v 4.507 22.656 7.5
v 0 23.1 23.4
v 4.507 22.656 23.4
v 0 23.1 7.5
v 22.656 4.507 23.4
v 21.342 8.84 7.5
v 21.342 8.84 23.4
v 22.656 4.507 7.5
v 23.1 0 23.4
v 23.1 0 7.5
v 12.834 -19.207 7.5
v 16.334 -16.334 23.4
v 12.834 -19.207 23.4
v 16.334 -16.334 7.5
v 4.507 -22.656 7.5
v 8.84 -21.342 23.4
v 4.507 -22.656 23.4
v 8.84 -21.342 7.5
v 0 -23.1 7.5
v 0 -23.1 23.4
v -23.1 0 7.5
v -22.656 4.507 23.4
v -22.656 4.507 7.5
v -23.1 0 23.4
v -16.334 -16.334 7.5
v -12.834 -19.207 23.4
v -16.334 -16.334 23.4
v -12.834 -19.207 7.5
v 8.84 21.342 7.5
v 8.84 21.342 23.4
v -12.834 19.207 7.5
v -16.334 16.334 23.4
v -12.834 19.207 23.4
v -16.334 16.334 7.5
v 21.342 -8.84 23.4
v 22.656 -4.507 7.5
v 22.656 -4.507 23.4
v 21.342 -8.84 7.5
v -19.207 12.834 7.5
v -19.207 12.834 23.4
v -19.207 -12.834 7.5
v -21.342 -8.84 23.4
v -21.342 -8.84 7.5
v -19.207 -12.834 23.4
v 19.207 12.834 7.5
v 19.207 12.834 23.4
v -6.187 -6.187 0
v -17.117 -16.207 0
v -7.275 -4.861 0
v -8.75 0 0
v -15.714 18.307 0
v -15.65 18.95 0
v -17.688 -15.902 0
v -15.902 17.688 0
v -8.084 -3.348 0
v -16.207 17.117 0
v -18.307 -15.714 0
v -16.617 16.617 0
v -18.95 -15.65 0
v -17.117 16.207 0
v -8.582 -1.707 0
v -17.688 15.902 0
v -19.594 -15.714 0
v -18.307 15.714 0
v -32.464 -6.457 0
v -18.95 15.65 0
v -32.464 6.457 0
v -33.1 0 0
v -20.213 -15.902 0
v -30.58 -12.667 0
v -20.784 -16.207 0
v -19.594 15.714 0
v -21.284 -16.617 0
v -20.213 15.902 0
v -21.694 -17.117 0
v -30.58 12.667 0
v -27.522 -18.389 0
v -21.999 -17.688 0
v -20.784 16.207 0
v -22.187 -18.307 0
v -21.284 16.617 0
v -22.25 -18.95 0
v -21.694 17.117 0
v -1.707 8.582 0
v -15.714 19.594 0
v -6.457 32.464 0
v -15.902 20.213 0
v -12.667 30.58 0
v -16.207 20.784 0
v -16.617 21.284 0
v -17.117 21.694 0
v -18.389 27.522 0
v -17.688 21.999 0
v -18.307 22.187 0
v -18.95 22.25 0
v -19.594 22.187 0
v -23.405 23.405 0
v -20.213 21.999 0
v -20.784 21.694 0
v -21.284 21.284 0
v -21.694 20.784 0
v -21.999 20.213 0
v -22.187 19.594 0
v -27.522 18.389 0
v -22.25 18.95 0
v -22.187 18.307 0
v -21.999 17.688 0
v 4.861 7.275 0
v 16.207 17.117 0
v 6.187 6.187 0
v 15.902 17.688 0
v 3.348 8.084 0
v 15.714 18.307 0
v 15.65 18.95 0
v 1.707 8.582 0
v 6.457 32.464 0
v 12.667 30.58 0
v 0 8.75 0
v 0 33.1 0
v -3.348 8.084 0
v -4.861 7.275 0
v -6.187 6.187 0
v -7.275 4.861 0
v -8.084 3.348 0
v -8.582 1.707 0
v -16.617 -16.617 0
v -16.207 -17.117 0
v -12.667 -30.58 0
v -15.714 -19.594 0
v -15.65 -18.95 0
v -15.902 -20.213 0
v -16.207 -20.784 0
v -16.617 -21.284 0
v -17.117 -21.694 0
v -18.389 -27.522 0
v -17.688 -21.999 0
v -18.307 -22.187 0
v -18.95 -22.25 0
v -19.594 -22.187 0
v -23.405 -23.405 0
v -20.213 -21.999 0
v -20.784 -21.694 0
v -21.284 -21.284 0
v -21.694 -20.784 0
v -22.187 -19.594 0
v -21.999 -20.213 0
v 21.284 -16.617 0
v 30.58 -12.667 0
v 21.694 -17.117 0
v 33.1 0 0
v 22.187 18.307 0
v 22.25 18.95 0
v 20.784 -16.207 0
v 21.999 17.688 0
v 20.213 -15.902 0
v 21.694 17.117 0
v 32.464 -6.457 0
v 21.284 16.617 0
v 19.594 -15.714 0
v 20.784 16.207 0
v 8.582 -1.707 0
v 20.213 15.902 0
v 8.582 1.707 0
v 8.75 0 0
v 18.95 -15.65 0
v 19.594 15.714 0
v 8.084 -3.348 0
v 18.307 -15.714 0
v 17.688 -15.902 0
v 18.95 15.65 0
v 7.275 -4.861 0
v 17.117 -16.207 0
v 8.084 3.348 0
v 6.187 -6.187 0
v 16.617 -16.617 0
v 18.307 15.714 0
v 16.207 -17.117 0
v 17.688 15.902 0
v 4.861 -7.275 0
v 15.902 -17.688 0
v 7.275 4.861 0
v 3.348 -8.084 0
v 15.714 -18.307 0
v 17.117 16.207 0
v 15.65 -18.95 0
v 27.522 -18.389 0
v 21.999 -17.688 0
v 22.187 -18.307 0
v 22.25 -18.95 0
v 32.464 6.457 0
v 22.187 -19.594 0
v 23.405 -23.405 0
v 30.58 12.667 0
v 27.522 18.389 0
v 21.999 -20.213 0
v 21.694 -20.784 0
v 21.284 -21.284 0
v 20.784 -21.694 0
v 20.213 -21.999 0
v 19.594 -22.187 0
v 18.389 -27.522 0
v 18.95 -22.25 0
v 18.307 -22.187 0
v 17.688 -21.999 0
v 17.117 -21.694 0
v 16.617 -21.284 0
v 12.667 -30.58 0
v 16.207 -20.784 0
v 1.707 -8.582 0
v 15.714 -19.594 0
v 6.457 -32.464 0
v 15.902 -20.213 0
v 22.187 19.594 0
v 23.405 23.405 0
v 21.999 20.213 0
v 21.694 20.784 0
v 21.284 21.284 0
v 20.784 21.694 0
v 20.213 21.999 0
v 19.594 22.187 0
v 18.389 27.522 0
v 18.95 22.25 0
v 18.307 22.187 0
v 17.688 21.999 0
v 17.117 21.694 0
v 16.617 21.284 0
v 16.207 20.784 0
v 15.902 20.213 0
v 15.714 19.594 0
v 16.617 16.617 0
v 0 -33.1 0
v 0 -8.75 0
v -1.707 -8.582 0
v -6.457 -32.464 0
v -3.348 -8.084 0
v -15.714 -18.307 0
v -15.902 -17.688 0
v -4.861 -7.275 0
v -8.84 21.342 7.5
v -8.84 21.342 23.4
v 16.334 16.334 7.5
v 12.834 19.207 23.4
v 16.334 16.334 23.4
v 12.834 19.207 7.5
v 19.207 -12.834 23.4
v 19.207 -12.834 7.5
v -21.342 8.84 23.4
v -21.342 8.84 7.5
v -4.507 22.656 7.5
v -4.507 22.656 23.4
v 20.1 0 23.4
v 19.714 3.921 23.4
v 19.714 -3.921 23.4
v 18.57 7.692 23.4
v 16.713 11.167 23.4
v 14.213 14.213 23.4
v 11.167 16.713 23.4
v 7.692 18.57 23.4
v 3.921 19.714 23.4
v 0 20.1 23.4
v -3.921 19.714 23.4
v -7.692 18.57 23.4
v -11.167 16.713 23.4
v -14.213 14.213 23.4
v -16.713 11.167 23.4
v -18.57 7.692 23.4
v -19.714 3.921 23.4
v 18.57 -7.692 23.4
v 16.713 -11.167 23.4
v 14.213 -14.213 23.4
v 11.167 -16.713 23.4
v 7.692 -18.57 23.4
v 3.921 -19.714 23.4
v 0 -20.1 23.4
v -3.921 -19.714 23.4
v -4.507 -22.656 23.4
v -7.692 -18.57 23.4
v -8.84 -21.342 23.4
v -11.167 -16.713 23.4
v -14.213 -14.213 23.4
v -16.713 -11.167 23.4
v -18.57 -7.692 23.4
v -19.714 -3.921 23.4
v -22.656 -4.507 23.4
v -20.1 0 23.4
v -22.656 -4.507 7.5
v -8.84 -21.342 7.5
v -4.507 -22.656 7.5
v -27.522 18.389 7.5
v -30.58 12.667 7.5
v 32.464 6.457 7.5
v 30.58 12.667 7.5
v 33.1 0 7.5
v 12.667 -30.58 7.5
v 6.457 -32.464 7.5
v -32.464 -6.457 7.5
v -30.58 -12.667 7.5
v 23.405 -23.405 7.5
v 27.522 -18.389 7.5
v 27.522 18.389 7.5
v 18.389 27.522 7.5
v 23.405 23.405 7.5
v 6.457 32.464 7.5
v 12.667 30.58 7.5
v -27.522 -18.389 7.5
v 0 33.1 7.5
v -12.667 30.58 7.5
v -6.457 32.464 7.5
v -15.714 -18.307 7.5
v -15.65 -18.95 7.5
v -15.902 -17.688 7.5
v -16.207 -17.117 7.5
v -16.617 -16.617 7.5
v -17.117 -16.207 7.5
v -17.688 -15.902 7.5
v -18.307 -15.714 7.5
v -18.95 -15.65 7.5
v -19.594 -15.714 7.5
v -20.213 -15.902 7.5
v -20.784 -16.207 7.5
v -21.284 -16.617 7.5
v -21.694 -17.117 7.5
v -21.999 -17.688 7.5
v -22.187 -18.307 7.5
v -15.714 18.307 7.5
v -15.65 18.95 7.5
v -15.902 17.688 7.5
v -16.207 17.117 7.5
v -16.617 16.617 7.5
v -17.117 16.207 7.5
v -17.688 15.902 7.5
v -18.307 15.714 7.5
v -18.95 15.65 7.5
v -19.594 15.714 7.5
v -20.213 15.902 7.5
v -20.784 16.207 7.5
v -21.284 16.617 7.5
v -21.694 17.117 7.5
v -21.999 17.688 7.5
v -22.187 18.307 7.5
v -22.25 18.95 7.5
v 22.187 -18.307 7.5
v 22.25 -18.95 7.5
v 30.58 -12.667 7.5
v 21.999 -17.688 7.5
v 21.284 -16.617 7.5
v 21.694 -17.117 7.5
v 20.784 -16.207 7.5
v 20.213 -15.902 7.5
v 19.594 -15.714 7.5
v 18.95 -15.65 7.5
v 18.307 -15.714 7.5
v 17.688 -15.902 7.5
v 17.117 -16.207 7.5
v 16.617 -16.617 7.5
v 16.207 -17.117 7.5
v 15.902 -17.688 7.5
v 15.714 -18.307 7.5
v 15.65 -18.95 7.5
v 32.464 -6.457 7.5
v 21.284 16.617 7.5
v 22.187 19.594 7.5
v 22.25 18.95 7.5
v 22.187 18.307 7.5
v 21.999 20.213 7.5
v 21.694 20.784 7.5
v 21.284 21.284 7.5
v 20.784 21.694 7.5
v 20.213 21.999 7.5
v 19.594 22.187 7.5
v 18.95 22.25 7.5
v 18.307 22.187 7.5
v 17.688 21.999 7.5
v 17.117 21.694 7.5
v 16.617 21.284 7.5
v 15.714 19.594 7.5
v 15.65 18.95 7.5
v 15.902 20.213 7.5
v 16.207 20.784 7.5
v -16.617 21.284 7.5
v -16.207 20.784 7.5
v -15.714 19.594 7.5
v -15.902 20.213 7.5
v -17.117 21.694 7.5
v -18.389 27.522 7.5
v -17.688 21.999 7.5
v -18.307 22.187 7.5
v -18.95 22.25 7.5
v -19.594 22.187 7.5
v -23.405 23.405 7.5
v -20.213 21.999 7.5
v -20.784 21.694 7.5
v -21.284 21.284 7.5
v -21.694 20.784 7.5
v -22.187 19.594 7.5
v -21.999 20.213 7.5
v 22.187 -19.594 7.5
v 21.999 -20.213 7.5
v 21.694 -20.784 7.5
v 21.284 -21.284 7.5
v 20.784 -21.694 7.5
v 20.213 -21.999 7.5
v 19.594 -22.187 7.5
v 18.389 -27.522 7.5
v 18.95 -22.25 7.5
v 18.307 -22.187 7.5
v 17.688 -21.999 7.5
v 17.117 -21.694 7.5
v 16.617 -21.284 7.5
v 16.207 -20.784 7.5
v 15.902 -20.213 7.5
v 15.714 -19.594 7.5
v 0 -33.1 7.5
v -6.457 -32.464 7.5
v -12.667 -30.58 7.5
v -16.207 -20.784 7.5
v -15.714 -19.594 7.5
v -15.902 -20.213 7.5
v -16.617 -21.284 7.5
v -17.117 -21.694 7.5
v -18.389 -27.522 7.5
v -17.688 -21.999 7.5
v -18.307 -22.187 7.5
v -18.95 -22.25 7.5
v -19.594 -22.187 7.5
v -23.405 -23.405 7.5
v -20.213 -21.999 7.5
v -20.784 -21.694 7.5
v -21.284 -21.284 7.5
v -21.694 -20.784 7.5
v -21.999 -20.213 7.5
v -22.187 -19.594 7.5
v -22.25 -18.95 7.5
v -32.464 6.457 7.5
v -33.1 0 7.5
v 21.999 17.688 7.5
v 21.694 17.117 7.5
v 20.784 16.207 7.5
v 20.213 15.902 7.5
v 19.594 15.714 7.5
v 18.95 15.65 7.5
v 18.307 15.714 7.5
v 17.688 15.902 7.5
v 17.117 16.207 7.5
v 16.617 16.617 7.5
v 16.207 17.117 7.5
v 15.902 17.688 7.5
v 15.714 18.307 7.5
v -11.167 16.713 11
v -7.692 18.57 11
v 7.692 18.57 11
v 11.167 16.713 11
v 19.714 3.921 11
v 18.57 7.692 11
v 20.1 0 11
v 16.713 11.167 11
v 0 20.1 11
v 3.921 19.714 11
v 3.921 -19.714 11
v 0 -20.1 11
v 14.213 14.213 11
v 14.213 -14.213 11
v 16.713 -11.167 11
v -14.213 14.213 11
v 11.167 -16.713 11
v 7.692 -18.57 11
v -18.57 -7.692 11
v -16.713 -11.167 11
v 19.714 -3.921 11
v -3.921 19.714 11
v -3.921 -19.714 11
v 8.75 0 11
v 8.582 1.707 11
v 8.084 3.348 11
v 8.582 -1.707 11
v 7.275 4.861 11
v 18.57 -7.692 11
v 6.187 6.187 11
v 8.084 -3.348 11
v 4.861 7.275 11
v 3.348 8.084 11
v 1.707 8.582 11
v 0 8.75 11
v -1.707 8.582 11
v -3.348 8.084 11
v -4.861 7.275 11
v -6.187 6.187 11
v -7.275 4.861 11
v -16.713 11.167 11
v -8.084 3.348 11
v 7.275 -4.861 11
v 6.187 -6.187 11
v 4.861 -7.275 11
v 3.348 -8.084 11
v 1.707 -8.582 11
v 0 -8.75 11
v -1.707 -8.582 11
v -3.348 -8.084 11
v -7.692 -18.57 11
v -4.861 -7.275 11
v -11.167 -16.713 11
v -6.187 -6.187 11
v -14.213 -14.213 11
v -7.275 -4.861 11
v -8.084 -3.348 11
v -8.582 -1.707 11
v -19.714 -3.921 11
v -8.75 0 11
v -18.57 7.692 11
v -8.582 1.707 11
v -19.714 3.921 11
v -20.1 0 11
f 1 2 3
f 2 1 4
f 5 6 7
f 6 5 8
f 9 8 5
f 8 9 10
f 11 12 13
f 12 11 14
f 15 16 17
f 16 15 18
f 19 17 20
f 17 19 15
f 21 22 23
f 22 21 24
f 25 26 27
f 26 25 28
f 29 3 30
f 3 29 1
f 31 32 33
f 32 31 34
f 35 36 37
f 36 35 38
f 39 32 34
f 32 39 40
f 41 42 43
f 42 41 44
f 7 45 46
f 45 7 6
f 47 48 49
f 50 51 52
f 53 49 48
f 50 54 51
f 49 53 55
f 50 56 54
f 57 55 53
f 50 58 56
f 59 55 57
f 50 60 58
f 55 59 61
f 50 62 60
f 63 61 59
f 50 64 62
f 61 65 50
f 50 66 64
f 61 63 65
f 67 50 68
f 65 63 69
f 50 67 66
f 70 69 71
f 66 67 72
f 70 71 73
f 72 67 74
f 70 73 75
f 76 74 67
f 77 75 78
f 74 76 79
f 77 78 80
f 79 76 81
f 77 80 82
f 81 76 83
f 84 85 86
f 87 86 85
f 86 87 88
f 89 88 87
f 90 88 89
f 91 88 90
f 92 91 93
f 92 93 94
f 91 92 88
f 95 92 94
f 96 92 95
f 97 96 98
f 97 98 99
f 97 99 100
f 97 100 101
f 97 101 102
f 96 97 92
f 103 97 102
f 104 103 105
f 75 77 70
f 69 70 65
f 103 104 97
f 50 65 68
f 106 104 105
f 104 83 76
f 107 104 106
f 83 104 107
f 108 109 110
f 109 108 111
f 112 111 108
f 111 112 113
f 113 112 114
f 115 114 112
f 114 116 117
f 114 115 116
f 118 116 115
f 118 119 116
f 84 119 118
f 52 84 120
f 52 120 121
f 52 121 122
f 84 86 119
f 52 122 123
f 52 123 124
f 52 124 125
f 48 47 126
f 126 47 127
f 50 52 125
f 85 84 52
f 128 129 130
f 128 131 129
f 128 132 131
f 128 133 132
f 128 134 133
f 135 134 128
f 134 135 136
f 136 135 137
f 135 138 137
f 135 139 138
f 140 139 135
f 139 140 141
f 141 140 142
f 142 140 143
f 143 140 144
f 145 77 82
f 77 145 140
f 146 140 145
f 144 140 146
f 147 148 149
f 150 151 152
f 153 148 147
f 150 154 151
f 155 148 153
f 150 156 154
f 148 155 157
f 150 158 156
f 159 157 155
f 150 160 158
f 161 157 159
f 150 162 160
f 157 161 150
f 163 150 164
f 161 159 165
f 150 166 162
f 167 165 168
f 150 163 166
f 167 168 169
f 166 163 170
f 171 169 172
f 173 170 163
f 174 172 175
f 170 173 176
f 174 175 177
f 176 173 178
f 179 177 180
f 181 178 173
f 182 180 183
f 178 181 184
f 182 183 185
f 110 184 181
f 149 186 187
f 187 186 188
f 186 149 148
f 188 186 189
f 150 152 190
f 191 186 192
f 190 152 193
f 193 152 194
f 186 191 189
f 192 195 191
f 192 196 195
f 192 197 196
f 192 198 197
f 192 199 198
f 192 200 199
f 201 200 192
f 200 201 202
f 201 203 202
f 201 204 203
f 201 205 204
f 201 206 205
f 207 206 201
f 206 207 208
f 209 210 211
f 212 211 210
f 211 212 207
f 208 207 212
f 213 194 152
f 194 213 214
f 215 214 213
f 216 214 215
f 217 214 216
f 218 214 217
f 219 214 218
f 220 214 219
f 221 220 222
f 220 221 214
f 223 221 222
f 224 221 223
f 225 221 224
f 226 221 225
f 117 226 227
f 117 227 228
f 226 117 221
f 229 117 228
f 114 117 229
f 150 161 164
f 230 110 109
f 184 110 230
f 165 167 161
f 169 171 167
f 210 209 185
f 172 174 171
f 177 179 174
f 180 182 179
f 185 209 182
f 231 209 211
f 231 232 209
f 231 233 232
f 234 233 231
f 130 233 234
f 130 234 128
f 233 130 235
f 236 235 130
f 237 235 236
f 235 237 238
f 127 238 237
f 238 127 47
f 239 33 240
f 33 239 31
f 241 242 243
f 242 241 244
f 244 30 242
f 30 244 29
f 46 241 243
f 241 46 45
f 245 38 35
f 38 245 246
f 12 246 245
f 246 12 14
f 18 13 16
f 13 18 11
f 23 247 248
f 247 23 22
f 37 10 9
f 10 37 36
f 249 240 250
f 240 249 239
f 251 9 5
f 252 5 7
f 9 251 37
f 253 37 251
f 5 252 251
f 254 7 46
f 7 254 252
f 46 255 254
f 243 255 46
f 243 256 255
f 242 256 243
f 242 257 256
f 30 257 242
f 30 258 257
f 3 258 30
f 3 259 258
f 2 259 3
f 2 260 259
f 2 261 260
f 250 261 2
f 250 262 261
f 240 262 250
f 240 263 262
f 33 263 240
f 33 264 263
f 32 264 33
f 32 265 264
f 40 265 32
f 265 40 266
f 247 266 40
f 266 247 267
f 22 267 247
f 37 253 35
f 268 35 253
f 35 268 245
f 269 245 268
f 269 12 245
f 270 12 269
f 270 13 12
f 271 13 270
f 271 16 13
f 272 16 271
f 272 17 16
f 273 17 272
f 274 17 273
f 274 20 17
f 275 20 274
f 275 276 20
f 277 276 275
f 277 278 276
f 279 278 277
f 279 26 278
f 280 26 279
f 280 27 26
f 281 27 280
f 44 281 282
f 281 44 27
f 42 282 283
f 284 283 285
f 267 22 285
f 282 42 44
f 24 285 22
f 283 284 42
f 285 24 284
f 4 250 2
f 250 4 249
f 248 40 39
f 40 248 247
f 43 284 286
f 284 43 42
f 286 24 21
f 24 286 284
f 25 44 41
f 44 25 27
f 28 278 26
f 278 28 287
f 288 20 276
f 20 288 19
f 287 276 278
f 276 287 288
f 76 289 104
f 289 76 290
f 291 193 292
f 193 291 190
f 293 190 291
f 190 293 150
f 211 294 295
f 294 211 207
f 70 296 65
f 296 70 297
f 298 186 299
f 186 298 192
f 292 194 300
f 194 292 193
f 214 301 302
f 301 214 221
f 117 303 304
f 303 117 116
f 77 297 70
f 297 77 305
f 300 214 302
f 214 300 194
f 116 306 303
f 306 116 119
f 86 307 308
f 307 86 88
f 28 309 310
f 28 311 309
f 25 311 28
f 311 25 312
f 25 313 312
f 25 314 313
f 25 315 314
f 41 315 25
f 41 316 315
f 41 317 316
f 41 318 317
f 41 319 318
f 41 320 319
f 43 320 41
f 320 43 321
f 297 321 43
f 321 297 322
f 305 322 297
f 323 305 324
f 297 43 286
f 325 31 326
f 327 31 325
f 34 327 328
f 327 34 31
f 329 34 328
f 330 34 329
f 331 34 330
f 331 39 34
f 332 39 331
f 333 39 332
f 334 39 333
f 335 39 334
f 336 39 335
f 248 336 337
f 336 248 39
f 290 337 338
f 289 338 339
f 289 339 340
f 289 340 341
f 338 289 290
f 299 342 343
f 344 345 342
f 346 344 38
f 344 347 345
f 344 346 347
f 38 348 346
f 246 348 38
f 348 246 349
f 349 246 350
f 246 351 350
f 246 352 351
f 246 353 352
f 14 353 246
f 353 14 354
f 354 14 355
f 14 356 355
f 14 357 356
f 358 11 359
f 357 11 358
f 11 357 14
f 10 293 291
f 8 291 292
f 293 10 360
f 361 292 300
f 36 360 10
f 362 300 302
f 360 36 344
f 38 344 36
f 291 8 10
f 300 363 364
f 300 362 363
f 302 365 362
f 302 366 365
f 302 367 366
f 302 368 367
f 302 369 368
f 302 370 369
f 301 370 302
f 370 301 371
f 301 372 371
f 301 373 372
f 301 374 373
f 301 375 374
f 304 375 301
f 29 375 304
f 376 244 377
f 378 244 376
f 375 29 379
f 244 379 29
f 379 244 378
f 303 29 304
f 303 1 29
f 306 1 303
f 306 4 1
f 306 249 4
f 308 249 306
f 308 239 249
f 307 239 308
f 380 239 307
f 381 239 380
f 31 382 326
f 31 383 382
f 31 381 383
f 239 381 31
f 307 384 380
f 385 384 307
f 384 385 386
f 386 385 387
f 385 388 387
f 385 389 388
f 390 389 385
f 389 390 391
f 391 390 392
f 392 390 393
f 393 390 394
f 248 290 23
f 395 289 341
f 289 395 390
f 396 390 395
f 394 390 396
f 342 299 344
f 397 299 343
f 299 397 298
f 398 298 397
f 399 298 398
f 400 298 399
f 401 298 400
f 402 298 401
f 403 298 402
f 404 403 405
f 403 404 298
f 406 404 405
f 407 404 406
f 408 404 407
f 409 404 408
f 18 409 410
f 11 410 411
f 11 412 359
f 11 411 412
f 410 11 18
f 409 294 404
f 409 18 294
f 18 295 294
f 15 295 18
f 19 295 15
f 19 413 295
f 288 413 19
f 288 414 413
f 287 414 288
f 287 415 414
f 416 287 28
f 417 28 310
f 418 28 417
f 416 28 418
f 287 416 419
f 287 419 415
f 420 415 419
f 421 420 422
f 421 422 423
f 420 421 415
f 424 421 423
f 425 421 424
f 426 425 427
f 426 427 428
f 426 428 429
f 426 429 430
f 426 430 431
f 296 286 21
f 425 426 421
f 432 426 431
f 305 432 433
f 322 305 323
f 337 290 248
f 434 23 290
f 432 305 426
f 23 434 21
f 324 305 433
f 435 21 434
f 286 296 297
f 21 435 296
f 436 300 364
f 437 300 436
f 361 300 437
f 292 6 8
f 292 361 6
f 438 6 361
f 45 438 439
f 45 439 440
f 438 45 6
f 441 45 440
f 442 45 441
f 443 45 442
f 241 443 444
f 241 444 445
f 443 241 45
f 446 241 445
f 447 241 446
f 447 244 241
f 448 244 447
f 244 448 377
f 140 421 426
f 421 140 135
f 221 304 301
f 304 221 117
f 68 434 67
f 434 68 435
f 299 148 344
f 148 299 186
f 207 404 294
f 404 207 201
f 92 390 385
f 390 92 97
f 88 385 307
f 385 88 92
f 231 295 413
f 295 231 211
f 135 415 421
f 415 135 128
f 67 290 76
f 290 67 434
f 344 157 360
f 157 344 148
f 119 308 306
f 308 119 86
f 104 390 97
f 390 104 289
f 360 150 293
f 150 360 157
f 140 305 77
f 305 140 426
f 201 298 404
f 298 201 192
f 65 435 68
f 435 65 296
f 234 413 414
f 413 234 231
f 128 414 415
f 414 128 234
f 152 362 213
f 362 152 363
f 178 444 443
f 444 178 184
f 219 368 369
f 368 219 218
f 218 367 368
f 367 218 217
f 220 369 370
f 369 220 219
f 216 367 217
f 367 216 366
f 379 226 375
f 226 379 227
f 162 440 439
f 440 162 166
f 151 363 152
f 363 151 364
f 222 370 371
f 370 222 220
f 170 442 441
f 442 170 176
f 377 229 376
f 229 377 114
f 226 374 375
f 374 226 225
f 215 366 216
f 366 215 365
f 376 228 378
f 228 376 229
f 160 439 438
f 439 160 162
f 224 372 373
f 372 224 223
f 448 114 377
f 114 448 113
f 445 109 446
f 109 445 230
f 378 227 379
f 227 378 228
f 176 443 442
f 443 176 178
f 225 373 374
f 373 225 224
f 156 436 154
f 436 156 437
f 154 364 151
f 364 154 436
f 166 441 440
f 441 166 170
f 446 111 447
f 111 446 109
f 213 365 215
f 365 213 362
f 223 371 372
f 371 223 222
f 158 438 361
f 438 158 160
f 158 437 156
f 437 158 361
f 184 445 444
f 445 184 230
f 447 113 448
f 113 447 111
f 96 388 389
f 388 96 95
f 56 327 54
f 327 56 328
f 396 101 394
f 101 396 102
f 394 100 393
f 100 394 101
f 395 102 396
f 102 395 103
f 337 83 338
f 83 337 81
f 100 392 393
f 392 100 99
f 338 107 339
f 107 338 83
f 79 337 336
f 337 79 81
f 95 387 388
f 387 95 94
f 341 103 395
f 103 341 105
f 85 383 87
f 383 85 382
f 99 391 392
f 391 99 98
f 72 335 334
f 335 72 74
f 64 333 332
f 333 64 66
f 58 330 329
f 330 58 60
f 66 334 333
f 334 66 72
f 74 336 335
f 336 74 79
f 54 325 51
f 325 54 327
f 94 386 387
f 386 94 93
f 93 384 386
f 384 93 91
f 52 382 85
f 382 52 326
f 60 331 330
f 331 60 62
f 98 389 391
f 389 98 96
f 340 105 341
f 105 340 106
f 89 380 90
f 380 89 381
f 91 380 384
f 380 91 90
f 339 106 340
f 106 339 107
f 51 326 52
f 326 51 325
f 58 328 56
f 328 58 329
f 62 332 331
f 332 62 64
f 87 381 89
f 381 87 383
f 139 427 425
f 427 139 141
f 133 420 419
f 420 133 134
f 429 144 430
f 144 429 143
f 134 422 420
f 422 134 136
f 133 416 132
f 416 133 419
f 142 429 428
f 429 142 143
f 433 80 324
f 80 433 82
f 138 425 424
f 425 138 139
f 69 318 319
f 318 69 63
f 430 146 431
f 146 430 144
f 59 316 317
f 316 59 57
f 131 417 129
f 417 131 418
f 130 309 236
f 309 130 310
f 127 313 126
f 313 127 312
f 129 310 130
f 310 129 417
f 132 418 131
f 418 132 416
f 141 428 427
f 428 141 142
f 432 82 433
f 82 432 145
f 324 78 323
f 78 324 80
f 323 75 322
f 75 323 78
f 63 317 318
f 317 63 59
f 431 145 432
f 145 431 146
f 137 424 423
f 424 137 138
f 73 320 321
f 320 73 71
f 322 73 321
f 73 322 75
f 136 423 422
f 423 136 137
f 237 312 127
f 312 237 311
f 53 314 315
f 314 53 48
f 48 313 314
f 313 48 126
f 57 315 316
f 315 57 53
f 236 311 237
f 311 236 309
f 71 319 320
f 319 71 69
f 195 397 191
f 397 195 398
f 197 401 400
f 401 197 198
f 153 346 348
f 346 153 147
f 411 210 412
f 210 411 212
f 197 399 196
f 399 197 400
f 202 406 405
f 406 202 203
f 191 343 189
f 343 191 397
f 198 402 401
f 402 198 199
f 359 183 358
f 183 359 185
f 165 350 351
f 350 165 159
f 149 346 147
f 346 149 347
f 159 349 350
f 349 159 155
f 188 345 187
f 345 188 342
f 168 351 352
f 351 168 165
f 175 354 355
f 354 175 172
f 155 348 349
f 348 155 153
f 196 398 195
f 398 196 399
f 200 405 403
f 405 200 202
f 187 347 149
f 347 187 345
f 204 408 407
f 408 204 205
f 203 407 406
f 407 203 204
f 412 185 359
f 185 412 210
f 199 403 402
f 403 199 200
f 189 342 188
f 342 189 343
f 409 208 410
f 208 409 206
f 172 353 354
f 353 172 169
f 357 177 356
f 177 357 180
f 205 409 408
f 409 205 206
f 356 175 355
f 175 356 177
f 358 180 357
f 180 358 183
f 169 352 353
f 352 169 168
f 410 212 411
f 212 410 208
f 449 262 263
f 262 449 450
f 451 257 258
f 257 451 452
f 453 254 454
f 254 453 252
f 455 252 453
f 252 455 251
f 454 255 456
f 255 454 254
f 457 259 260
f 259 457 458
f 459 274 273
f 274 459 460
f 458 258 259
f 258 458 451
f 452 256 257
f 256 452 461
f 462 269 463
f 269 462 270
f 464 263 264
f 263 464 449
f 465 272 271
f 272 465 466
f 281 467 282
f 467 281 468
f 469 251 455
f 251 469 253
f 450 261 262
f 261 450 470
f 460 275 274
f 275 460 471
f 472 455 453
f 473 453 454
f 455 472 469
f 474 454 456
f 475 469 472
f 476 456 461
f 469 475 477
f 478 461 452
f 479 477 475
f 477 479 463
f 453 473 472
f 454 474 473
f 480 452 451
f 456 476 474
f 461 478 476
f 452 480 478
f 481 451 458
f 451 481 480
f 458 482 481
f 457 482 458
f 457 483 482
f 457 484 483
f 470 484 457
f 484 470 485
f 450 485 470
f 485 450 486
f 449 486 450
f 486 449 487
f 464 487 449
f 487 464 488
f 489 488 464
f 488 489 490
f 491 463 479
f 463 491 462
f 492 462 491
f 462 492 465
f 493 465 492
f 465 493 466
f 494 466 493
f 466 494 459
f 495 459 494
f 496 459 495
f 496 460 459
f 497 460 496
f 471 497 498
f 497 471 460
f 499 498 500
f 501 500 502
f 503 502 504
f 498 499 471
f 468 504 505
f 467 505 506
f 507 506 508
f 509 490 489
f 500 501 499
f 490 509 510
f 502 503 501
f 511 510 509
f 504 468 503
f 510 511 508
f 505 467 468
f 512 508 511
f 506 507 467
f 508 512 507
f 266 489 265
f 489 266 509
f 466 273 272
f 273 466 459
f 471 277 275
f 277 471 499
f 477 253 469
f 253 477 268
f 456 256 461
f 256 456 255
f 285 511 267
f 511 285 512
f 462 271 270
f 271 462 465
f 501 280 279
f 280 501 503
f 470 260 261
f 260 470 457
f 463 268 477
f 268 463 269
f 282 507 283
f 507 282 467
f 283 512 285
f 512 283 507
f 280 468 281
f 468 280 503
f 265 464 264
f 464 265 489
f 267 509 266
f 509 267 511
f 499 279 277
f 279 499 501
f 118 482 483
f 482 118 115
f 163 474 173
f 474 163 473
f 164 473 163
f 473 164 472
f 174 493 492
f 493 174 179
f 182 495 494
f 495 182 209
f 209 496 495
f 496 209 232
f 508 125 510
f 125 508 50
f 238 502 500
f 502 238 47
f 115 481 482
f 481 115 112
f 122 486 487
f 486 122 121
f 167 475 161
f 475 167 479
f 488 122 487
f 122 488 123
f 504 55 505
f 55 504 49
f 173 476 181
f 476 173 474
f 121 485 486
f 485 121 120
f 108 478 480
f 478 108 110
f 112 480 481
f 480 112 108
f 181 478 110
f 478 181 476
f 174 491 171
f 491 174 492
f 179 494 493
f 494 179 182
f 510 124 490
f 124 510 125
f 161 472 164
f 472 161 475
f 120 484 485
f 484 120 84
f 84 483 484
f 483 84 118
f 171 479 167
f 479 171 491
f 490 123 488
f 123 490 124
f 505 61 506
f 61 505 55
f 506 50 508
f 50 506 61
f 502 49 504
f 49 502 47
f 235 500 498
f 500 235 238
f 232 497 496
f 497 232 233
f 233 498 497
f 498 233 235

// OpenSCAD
$fn = 32;

// ----------------------------------------------------------------------
// Bearing housing: seat for 6203 (40 x 12 mm), 46.2 mm body
// ----------------------------------------------------------------------

// --- parameters (mm) ---
body_od = 46.2;           // housing outside diameter
body_h = 23.4;            // overall housing height
wall = 3;                 // wall thickness
pocket_d = 40.2;          // 6203 seat, 0.2 mm clearance
seat_h = 12.4;            // pocket depth
shoulder = 5;             // shoulder under the bearing
pass_d = 17.5;            // shaft passage
flange_dia = 66.2;        // mounting flange diameter
flange_t = 6;             // flange thickness
bolt_d = 6.6;             // flange bolt clearance
bolt_r = 26.8;            // flange bolt circle radius

module body() {
  cylinder(h = body_h, d = body_od);
}

module flange() {
  /* flange sunk 1.5 mm into the body */
  cylinder(h = flange_t + 1.5, d = flange_dia);
}

difference() {
  union() {
    body();
    flange();
  }
  translate([0, 0, body_h - seat_h]) cylinder(h = seat_h + 1, d = pocket_d);
  translate([0, 0, -1]) cylinder(h = body_h - seat_h + 1, d = pass_d);
  for (i = [0 : 3]) rotate([0, 0, 45 + i * 90]) translate([bolt_r, 0, -1])
    cylinder(h = flange_t + 3, d = bolt_d);
}
